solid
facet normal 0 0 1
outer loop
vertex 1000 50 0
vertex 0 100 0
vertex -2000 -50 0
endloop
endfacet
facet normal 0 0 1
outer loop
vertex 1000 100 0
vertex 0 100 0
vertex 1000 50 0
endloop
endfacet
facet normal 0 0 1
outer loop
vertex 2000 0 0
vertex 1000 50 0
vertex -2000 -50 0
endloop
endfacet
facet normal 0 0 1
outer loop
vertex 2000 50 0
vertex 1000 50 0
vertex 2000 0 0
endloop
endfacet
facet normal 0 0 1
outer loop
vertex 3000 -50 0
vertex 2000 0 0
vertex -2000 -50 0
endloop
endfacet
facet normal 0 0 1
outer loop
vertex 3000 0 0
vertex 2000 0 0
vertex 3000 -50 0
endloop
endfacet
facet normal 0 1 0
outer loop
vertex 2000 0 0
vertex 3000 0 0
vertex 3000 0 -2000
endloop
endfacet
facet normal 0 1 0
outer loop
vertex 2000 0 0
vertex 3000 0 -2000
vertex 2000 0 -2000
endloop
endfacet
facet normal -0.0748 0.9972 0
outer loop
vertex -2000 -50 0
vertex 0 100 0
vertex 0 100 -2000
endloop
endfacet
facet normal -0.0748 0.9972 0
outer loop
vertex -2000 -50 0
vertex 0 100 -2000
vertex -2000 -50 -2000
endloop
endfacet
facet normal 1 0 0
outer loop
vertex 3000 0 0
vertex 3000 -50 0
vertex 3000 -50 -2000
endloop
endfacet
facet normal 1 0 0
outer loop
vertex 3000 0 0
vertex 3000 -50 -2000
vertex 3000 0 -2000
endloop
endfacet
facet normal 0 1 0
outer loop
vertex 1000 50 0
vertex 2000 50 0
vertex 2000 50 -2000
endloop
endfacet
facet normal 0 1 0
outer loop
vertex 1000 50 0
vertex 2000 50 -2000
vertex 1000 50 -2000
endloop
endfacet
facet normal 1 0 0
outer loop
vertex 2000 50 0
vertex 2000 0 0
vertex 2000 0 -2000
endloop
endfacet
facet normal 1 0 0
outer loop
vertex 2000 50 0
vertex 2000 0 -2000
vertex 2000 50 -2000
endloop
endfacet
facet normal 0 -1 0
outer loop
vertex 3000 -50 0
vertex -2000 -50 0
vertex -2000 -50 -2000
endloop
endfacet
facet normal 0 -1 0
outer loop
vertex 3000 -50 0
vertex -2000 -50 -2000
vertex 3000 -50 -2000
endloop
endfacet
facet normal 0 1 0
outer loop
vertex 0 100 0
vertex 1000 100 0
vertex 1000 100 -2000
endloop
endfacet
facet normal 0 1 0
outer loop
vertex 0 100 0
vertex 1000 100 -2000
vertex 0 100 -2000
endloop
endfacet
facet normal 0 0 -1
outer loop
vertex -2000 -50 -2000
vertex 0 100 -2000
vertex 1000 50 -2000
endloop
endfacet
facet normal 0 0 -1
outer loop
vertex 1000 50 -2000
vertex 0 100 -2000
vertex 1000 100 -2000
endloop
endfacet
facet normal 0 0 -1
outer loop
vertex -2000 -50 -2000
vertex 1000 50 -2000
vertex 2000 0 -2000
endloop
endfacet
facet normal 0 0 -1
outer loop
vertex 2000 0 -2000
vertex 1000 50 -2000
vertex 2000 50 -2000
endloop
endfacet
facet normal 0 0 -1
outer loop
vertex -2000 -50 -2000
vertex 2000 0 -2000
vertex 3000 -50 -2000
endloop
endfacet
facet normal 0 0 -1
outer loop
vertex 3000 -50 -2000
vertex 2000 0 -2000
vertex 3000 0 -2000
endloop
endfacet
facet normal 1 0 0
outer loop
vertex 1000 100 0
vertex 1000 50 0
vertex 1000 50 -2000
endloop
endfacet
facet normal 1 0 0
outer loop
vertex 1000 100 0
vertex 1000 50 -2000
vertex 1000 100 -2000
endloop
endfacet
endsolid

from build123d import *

# Parameters (mm, degrees)
BOSS_EXTRUDE3_DEPTH = 2000


with BuildPart() as part:
    # Sketch1 → Boss-Extrude3 (new body)
    with BuildSketch(Plane.XY):
        Polygon((0, -50), (3000, -50), (3000, 0), (2000, 0), (2000, 50), (1000, 50), (1000, 100), (0, 100), align=None)
        Polygon((0, 100), (-2000, -50), (0, -50), align=None)
    extrude(amount=-BOSS_EXTRUDE3_DEPTH)


solid = part.part
